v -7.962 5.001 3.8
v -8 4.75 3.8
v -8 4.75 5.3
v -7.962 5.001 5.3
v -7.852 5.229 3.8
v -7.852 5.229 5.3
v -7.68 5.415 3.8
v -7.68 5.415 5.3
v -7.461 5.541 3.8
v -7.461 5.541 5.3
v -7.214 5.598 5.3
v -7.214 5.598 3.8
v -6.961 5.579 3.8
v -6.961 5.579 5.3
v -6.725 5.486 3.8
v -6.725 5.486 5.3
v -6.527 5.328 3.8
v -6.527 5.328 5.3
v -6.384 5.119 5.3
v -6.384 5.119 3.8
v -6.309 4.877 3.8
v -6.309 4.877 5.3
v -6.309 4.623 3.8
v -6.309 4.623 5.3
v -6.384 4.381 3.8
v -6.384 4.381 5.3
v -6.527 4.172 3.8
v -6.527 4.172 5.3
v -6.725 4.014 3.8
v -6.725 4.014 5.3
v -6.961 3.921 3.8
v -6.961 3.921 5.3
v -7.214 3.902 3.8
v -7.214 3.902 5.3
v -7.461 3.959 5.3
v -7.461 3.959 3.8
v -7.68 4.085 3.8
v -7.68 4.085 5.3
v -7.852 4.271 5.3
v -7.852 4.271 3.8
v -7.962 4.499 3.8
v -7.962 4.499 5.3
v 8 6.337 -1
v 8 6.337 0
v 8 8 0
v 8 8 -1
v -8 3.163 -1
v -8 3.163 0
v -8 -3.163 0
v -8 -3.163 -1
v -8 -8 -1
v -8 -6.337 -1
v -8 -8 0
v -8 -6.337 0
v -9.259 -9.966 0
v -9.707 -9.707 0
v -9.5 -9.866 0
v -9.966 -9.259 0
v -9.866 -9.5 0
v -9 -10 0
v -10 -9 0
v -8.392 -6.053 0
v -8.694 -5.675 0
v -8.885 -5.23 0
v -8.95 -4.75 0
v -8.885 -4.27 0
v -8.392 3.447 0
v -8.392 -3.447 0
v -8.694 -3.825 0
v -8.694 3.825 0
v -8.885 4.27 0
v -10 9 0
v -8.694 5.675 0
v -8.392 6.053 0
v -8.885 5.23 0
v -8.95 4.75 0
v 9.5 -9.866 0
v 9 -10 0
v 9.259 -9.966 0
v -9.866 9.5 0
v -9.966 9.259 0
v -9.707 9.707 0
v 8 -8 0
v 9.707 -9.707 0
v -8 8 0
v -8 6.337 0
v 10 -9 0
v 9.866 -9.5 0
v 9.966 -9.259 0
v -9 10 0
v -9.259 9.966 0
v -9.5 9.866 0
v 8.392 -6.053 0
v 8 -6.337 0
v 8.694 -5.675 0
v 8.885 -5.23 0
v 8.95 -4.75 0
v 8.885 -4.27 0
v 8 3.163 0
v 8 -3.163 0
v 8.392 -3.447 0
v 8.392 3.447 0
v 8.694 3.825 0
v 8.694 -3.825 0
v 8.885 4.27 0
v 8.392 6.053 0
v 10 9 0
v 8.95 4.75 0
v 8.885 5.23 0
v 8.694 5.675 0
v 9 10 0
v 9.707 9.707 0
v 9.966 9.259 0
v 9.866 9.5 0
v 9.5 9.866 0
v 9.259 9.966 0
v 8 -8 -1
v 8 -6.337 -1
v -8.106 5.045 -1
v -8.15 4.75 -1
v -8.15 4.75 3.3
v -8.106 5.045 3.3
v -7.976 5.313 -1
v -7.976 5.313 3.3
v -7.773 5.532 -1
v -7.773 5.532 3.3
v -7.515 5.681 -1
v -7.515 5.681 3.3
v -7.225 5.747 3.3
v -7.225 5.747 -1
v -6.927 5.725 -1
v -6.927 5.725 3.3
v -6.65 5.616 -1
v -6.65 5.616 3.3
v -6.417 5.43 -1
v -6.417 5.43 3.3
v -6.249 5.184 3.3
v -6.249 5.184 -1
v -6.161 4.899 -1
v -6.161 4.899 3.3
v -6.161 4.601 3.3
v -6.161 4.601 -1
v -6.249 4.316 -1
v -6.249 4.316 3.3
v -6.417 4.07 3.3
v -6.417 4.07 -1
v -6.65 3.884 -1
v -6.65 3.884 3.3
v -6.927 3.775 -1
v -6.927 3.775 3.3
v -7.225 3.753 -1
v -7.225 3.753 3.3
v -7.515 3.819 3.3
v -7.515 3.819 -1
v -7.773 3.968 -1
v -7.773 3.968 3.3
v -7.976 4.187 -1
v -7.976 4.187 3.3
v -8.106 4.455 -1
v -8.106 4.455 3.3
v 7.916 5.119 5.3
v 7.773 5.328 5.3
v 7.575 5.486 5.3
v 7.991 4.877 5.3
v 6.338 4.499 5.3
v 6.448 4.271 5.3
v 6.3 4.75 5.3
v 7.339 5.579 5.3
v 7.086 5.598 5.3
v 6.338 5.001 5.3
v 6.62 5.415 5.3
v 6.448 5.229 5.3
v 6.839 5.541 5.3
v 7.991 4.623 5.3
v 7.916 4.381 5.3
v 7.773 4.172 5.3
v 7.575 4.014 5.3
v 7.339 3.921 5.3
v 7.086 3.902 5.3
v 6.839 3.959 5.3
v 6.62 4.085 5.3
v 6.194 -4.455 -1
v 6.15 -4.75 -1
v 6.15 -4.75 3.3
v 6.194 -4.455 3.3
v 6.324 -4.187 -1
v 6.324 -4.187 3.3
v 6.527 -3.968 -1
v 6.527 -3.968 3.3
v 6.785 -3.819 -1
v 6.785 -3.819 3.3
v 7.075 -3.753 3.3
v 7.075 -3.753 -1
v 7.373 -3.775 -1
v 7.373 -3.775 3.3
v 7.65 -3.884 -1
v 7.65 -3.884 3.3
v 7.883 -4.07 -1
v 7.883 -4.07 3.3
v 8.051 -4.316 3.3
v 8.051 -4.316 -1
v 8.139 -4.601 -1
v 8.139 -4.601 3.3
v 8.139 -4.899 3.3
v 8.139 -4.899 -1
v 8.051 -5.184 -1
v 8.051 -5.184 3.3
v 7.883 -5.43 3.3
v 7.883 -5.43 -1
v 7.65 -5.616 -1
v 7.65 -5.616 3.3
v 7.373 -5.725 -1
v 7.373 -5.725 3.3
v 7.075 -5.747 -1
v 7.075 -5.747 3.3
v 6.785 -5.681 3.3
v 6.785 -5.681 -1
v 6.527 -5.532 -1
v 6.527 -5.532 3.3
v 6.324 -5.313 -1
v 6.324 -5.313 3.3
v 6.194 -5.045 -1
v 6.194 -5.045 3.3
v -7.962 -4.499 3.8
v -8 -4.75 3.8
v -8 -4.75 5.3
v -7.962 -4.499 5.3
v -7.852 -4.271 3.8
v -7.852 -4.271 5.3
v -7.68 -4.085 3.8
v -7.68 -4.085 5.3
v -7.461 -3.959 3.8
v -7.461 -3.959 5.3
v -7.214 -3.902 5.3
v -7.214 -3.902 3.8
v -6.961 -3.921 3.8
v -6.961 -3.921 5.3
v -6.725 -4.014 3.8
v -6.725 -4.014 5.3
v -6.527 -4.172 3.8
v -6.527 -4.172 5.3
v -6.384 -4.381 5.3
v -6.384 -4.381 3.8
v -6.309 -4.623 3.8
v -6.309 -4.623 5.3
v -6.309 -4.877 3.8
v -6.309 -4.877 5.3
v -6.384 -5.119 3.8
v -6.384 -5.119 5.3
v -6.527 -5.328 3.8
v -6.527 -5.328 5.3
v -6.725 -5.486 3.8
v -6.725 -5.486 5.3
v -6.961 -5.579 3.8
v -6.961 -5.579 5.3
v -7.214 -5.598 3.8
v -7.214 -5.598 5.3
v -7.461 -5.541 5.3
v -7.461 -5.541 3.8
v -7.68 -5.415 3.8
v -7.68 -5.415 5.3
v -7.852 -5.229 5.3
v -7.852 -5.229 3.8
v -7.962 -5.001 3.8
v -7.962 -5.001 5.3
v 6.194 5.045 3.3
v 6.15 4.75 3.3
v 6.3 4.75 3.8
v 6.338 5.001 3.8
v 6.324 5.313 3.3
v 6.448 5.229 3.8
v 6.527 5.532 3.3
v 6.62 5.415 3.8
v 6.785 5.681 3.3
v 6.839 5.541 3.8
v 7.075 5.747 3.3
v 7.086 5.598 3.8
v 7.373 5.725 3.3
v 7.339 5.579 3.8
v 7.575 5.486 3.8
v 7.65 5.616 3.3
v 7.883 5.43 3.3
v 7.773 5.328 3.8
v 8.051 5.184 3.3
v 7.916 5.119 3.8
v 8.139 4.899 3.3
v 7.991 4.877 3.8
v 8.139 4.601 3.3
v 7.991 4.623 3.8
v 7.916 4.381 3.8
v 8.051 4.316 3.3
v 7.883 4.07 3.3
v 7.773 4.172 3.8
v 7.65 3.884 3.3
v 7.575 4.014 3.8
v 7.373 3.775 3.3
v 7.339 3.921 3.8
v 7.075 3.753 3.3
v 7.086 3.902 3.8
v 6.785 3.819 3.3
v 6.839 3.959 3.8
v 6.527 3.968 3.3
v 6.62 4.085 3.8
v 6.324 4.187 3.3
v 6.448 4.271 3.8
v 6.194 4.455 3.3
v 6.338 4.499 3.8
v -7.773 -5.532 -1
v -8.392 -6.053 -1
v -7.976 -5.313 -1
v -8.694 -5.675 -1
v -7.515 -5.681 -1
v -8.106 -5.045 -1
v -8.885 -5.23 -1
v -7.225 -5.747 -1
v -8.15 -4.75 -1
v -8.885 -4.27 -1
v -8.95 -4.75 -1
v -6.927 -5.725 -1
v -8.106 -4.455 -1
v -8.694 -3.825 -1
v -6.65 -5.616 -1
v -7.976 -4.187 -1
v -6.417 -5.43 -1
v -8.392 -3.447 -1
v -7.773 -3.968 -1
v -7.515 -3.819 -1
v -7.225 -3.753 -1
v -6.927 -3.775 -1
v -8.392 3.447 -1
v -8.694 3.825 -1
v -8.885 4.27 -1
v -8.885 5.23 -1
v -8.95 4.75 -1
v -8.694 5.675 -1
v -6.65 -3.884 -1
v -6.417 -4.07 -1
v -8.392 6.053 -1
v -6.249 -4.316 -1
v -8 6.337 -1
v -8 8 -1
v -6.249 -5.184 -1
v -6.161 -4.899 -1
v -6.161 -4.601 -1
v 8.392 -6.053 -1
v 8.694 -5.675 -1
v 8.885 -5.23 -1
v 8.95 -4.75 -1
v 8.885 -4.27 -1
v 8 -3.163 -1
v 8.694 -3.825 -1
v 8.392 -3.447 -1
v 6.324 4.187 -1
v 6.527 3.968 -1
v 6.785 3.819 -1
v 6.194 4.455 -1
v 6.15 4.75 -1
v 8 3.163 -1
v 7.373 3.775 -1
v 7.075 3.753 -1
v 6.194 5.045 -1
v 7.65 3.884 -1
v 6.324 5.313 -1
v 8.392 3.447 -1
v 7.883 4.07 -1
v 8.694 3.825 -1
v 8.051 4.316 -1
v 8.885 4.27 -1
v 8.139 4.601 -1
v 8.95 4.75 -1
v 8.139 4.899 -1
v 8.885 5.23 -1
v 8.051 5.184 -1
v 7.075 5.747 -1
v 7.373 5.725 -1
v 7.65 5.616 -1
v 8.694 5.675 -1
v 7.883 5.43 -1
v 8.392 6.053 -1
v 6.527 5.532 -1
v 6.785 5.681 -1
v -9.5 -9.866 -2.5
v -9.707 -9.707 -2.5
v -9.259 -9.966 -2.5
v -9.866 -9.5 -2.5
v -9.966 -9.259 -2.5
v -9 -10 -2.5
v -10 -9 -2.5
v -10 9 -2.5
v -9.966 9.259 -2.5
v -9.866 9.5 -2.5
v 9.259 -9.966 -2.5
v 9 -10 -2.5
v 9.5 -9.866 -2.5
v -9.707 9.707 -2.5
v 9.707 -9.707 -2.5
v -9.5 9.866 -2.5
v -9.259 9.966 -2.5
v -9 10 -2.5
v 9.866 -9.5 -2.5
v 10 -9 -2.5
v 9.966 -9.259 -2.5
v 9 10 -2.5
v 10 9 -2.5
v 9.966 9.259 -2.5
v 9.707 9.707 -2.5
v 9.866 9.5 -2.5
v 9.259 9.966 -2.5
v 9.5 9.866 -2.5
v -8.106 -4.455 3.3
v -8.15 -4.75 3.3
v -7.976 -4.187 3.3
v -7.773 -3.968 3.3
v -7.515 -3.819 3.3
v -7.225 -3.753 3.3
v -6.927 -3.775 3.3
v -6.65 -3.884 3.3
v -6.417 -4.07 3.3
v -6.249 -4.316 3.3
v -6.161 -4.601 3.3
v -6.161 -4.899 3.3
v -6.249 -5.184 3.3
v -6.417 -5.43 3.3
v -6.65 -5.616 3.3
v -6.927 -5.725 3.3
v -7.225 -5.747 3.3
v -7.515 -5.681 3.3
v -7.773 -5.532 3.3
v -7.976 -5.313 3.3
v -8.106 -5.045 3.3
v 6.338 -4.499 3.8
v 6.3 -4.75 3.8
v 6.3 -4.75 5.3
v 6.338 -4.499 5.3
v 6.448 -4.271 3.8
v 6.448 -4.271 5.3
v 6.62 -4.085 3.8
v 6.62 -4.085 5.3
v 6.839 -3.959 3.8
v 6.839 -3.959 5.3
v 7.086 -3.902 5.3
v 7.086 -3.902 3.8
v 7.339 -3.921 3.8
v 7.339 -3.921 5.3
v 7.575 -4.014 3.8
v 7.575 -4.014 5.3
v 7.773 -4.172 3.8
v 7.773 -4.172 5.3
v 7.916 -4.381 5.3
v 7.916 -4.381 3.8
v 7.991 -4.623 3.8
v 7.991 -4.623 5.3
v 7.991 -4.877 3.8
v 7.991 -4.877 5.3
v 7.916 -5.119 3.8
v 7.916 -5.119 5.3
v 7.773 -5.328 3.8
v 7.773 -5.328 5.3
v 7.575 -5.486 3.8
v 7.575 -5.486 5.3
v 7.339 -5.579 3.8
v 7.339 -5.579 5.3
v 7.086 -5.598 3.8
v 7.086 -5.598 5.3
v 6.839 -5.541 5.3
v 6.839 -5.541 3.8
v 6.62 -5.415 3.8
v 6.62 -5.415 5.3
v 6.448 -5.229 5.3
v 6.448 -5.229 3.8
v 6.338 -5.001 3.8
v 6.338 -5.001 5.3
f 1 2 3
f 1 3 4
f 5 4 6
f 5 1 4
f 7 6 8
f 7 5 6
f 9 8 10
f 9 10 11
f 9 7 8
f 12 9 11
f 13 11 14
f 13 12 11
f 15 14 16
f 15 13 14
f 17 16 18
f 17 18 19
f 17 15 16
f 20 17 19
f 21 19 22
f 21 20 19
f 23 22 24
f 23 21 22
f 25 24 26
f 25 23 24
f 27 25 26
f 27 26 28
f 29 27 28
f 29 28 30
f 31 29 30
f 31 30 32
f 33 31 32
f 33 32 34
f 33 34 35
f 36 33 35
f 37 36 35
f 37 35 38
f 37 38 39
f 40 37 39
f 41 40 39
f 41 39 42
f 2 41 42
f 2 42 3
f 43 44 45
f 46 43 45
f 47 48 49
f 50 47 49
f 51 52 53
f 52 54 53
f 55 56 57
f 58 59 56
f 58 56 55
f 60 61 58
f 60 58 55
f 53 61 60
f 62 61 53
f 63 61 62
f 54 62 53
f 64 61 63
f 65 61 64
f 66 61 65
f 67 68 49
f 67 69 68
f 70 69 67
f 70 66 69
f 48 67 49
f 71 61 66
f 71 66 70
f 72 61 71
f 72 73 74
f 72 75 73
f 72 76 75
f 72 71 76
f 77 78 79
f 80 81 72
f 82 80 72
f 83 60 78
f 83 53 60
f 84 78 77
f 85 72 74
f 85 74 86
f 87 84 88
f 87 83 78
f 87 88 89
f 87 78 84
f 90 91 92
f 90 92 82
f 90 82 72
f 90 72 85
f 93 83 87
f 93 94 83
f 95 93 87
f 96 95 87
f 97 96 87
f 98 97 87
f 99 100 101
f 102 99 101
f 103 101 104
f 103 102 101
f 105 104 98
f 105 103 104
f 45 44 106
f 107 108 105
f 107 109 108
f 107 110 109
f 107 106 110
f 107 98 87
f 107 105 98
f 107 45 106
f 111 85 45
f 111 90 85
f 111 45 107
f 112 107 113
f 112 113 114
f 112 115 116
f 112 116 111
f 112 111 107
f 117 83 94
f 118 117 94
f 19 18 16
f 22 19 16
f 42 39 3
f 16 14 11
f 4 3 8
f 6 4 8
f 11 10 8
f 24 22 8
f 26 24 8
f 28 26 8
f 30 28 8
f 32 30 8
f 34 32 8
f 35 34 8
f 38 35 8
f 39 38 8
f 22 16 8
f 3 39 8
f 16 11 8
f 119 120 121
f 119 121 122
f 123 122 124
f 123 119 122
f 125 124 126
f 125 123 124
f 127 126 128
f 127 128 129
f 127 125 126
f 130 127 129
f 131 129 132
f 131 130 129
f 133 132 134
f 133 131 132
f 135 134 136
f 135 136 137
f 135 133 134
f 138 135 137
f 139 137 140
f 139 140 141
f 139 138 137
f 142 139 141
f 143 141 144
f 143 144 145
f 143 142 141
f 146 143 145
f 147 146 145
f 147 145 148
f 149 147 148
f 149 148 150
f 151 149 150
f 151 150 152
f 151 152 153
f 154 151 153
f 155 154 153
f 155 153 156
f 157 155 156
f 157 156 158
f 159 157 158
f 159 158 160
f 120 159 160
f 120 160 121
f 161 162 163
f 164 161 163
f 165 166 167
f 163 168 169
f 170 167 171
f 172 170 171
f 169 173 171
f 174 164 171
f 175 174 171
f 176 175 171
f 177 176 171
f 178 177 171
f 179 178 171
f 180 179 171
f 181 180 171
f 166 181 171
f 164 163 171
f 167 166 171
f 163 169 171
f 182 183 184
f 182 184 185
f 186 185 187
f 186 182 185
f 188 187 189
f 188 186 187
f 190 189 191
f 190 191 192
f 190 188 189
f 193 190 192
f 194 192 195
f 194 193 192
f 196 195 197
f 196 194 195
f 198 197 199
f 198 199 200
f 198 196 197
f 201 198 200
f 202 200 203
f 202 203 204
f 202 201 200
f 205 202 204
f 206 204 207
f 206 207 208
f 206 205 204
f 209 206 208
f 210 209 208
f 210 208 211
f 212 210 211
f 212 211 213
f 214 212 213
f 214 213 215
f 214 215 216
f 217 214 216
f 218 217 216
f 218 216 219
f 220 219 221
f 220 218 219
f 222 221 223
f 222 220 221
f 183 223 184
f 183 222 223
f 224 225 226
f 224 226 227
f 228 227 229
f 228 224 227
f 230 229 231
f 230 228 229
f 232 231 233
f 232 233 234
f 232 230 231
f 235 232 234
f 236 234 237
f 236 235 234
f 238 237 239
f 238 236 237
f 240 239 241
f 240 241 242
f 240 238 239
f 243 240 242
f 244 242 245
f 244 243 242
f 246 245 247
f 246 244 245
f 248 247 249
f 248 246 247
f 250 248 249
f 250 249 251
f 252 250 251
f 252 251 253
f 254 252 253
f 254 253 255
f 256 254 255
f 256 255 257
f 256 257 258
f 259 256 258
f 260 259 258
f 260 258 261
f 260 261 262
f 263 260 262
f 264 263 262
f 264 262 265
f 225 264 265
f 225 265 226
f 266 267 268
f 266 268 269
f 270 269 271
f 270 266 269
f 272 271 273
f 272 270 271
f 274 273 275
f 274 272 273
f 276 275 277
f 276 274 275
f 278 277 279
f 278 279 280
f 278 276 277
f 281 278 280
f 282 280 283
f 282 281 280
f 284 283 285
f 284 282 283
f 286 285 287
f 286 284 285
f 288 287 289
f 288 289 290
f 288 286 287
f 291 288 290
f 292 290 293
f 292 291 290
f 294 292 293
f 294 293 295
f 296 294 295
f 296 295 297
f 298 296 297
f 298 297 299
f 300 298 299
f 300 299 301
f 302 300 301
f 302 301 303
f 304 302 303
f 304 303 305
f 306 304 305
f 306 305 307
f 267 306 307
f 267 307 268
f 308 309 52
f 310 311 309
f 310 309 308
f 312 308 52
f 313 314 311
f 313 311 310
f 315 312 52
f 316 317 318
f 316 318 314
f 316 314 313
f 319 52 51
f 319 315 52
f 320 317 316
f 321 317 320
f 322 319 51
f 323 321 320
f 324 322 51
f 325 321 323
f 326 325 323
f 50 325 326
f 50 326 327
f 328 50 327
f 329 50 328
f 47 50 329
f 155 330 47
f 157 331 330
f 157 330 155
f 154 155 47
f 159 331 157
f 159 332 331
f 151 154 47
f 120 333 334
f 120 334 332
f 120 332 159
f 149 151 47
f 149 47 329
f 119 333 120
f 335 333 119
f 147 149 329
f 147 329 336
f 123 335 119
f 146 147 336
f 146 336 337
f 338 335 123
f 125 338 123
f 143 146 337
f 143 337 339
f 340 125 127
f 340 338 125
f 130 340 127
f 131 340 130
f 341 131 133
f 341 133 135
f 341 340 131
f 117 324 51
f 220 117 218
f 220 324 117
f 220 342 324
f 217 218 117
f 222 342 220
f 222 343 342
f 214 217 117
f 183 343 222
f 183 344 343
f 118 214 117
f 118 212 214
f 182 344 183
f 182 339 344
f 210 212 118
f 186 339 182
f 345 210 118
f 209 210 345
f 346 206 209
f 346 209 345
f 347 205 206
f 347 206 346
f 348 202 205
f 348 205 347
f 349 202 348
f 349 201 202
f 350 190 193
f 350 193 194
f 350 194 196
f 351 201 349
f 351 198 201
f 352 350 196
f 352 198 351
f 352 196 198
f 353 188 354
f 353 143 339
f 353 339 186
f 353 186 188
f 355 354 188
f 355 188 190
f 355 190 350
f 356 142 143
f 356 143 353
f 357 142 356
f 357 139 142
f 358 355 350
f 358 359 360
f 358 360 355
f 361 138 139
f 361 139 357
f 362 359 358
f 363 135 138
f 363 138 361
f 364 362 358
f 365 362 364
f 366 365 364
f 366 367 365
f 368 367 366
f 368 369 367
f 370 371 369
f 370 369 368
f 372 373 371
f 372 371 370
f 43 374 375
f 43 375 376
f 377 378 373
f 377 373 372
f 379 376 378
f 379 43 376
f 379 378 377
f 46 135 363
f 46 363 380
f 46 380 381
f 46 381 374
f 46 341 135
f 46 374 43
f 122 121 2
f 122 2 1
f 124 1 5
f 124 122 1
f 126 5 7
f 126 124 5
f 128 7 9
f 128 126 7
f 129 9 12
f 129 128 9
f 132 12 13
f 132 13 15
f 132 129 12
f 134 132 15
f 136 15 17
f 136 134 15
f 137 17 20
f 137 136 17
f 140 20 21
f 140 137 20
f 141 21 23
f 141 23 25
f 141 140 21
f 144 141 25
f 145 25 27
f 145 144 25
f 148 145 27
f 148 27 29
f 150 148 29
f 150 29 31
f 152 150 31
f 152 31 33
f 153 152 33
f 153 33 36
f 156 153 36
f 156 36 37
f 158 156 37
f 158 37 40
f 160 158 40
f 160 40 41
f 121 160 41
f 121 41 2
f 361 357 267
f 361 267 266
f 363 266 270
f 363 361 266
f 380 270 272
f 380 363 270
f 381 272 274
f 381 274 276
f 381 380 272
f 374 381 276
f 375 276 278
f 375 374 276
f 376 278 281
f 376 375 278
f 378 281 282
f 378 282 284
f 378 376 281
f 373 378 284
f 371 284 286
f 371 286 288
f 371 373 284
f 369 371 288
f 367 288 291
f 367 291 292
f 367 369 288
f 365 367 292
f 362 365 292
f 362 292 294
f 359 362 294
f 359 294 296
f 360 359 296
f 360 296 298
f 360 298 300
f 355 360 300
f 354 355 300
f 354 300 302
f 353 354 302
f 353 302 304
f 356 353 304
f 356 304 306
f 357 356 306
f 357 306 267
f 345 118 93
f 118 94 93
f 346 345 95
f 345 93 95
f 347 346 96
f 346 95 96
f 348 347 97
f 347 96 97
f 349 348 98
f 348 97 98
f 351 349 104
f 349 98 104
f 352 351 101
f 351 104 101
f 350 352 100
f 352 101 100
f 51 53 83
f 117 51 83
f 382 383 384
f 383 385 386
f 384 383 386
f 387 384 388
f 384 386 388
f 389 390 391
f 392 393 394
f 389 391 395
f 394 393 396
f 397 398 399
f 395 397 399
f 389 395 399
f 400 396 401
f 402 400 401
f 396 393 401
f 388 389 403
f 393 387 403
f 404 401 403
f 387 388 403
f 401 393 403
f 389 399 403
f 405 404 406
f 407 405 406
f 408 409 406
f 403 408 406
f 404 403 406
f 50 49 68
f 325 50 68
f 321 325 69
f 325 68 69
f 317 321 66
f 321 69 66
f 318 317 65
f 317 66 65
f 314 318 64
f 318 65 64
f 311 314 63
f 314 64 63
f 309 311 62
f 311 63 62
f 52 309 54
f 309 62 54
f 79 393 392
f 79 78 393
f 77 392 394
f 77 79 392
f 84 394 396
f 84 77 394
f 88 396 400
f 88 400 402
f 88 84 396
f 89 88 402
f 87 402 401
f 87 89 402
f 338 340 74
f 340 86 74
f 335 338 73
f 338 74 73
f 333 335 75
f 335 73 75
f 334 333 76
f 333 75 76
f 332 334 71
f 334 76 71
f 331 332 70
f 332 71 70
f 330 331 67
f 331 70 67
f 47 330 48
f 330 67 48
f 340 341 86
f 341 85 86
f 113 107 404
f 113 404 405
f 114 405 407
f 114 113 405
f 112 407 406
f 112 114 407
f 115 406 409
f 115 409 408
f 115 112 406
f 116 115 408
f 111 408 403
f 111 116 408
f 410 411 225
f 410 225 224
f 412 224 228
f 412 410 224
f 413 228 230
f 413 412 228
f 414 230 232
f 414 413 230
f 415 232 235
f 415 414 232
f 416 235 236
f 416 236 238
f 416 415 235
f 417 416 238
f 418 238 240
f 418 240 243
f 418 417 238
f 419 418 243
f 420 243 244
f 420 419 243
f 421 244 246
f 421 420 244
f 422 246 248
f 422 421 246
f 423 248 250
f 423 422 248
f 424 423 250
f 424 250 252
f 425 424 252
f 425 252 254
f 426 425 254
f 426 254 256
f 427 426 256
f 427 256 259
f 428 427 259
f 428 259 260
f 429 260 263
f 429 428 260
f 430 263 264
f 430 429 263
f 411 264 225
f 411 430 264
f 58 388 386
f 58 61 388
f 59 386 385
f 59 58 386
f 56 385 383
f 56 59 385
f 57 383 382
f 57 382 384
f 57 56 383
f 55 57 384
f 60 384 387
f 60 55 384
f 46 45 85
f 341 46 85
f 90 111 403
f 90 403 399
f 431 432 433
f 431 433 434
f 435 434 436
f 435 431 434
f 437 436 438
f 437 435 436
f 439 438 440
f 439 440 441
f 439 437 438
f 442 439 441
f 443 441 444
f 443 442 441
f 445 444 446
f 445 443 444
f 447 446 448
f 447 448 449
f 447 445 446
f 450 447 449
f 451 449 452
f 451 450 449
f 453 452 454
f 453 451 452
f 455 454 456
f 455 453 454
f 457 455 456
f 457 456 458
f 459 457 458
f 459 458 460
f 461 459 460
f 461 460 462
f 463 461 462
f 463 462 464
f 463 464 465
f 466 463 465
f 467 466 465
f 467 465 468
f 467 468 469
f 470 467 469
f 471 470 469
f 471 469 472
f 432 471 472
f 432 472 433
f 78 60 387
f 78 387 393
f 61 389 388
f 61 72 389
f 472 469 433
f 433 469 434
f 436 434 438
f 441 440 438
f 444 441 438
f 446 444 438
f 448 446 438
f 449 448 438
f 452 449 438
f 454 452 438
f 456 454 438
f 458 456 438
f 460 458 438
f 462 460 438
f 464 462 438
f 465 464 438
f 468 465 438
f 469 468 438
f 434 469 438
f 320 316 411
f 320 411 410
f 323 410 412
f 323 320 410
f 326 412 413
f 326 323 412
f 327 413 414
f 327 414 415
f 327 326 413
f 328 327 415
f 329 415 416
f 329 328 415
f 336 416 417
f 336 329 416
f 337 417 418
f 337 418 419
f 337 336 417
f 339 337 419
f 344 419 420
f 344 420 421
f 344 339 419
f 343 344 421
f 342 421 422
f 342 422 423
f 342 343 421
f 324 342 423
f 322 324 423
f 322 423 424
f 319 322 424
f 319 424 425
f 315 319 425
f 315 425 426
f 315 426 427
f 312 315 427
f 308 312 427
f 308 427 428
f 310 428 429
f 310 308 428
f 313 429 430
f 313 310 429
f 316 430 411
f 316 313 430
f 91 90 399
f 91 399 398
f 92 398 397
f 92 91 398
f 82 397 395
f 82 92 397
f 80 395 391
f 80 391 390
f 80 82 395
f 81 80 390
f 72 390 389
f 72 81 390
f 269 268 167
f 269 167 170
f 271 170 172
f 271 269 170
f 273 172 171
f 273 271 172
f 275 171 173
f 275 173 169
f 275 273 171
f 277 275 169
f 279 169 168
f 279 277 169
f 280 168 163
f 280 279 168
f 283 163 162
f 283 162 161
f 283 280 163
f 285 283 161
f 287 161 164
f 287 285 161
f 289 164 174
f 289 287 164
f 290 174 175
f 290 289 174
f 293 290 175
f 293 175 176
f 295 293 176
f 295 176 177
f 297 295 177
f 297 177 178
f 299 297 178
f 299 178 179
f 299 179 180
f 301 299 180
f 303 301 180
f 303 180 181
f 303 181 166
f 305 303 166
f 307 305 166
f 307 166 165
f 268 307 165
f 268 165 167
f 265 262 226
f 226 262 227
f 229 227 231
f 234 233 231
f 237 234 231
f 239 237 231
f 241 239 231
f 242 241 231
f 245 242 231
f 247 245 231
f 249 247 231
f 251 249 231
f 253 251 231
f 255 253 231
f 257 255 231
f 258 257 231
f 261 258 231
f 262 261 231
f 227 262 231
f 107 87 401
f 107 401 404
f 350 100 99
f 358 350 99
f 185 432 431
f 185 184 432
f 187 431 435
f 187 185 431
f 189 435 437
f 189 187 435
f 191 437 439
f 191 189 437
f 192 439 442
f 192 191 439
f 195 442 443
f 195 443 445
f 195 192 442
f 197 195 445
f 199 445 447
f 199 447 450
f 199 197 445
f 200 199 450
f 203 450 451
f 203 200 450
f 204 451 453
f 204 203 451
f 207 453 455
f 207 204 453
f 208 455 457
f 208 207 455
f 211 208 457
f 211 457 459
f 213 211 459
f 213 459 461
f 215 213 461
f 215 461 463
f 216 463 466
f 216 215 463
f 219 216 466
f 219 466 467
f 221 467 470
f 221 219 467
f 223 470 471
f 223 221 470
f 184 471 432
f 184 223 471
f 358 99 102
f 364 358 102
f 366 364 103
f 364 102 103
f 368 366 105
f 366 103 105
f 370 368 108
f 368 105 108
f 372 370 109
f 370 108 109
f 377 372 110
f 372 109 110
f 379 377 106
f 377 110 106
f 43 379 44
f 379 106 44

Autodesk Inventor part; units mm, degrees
sketch "Sketch_1" plane through (0, 0, 0) normal (0, 0, 1) x (1, 0, 0)
  arc A0 (-10, -9) -> (-9, -10) centre (-9, -9) ccw
  line L0 (-9, -10) -> (9, -10)
  arc A1 (9, -10) -> (10, -9) centre (9, -9) ccw
  line L1 (10, -9) -> (10, 9)
  arc A2 (10, 9) -> (9, 10) centre (9, 9) ccw
  line L2 (9, 10) -> (-9, 10)
  arc A3 (-9, 10) -> (-10, 9) centre (-9, 9) ccw
  line L3 (-10, 9) -> (-10, -9)
extrude "Extrusion1" add sketch "Sketch_1" against normal blind 2.5
sketch "Sketch_2" plane through (0, 0, 0) normal (0, 0, 1) x (1, 0, 0)
  arc A0 (-8, 6.3367) -> (-8, 3.1633) centre (-7.15, 4.75) ccw
  line L0 (-8, 3.1633) -> (-8, -3.1633)
  arc A1 (-8, -3.1633) -> (-8, -6.3367) centre (-7.15, -4.75) ccw
  line L1 (-8, -6.3367) -> (-8, -8)
  line L2 (-8, -8) -> (8, -8)
  line L3 (8, -8) -> (8, -6.3367)
  arc A2 (8, -6.3367) -> (8, -3.1633) centre (7.15, -4.75) ccw
  line L4 (8, -3.1633) -> (8, 3.1633)
  arc A3 (8, 3.1633) -> (8, 6.3367) centre (7.15, 4.75) ccw
  line L5 (8, 6.3367) -> (8, 8)
  line L6 (8, 8) -> (-8, 8)
  line L7 (-8, 8) -> (-8, 6.3367)
extrude "Extrusion2" cut sketch "Sketch_2" against normal blind 1
sketch "Sketch_3" plane through (0, 4.75, 0) normal (0, 1, 0) x (1, 0, 0)
  line L0 (-7.15, 1) -> (-7.15, -5.3)
  line L1 (-7.15, -5.3) -> (-8, -5.3)
  line L2 (-8, -5.3) -> (-8, -3.8)
  line L3 (-8, -3.8) -> (-8.15, -3.3)
  line L4 (-8.15, -3.3) -> (-8.15, 1)
  line L5 (-8.15, 1) -> (-7.15, 1)
  line L6 (-7.15, 1) -> (-7.15, -5.3)
revolve "Revolution1" add sketch "Sketch_3" angle 360 about axis through (-7.15, 4.75, -1) along (0, 0, -1)
pattern_linear "Rectangular Pattern1" count 2 spacing 14.3 along (1, 0, 0) count 2 spacing 9.5 along (0, -1, 0) of "Revolution1"
ref_plane "Cap_to_Frame_XY" through (0, 0, 0) normal (0, 0, -1) x (1, 0, 0)
ref_plane "Cap_to_Frame_YZ" through (0, 0, 0) normal (1, 0, 0) x (0, -1, 0)
ref_plane "Cap_to_Frame_ZX" through (0, 0, 0) normal (0, -1, 0) x (0, 0, -1)
properties part number "HFC5-2020-B"
